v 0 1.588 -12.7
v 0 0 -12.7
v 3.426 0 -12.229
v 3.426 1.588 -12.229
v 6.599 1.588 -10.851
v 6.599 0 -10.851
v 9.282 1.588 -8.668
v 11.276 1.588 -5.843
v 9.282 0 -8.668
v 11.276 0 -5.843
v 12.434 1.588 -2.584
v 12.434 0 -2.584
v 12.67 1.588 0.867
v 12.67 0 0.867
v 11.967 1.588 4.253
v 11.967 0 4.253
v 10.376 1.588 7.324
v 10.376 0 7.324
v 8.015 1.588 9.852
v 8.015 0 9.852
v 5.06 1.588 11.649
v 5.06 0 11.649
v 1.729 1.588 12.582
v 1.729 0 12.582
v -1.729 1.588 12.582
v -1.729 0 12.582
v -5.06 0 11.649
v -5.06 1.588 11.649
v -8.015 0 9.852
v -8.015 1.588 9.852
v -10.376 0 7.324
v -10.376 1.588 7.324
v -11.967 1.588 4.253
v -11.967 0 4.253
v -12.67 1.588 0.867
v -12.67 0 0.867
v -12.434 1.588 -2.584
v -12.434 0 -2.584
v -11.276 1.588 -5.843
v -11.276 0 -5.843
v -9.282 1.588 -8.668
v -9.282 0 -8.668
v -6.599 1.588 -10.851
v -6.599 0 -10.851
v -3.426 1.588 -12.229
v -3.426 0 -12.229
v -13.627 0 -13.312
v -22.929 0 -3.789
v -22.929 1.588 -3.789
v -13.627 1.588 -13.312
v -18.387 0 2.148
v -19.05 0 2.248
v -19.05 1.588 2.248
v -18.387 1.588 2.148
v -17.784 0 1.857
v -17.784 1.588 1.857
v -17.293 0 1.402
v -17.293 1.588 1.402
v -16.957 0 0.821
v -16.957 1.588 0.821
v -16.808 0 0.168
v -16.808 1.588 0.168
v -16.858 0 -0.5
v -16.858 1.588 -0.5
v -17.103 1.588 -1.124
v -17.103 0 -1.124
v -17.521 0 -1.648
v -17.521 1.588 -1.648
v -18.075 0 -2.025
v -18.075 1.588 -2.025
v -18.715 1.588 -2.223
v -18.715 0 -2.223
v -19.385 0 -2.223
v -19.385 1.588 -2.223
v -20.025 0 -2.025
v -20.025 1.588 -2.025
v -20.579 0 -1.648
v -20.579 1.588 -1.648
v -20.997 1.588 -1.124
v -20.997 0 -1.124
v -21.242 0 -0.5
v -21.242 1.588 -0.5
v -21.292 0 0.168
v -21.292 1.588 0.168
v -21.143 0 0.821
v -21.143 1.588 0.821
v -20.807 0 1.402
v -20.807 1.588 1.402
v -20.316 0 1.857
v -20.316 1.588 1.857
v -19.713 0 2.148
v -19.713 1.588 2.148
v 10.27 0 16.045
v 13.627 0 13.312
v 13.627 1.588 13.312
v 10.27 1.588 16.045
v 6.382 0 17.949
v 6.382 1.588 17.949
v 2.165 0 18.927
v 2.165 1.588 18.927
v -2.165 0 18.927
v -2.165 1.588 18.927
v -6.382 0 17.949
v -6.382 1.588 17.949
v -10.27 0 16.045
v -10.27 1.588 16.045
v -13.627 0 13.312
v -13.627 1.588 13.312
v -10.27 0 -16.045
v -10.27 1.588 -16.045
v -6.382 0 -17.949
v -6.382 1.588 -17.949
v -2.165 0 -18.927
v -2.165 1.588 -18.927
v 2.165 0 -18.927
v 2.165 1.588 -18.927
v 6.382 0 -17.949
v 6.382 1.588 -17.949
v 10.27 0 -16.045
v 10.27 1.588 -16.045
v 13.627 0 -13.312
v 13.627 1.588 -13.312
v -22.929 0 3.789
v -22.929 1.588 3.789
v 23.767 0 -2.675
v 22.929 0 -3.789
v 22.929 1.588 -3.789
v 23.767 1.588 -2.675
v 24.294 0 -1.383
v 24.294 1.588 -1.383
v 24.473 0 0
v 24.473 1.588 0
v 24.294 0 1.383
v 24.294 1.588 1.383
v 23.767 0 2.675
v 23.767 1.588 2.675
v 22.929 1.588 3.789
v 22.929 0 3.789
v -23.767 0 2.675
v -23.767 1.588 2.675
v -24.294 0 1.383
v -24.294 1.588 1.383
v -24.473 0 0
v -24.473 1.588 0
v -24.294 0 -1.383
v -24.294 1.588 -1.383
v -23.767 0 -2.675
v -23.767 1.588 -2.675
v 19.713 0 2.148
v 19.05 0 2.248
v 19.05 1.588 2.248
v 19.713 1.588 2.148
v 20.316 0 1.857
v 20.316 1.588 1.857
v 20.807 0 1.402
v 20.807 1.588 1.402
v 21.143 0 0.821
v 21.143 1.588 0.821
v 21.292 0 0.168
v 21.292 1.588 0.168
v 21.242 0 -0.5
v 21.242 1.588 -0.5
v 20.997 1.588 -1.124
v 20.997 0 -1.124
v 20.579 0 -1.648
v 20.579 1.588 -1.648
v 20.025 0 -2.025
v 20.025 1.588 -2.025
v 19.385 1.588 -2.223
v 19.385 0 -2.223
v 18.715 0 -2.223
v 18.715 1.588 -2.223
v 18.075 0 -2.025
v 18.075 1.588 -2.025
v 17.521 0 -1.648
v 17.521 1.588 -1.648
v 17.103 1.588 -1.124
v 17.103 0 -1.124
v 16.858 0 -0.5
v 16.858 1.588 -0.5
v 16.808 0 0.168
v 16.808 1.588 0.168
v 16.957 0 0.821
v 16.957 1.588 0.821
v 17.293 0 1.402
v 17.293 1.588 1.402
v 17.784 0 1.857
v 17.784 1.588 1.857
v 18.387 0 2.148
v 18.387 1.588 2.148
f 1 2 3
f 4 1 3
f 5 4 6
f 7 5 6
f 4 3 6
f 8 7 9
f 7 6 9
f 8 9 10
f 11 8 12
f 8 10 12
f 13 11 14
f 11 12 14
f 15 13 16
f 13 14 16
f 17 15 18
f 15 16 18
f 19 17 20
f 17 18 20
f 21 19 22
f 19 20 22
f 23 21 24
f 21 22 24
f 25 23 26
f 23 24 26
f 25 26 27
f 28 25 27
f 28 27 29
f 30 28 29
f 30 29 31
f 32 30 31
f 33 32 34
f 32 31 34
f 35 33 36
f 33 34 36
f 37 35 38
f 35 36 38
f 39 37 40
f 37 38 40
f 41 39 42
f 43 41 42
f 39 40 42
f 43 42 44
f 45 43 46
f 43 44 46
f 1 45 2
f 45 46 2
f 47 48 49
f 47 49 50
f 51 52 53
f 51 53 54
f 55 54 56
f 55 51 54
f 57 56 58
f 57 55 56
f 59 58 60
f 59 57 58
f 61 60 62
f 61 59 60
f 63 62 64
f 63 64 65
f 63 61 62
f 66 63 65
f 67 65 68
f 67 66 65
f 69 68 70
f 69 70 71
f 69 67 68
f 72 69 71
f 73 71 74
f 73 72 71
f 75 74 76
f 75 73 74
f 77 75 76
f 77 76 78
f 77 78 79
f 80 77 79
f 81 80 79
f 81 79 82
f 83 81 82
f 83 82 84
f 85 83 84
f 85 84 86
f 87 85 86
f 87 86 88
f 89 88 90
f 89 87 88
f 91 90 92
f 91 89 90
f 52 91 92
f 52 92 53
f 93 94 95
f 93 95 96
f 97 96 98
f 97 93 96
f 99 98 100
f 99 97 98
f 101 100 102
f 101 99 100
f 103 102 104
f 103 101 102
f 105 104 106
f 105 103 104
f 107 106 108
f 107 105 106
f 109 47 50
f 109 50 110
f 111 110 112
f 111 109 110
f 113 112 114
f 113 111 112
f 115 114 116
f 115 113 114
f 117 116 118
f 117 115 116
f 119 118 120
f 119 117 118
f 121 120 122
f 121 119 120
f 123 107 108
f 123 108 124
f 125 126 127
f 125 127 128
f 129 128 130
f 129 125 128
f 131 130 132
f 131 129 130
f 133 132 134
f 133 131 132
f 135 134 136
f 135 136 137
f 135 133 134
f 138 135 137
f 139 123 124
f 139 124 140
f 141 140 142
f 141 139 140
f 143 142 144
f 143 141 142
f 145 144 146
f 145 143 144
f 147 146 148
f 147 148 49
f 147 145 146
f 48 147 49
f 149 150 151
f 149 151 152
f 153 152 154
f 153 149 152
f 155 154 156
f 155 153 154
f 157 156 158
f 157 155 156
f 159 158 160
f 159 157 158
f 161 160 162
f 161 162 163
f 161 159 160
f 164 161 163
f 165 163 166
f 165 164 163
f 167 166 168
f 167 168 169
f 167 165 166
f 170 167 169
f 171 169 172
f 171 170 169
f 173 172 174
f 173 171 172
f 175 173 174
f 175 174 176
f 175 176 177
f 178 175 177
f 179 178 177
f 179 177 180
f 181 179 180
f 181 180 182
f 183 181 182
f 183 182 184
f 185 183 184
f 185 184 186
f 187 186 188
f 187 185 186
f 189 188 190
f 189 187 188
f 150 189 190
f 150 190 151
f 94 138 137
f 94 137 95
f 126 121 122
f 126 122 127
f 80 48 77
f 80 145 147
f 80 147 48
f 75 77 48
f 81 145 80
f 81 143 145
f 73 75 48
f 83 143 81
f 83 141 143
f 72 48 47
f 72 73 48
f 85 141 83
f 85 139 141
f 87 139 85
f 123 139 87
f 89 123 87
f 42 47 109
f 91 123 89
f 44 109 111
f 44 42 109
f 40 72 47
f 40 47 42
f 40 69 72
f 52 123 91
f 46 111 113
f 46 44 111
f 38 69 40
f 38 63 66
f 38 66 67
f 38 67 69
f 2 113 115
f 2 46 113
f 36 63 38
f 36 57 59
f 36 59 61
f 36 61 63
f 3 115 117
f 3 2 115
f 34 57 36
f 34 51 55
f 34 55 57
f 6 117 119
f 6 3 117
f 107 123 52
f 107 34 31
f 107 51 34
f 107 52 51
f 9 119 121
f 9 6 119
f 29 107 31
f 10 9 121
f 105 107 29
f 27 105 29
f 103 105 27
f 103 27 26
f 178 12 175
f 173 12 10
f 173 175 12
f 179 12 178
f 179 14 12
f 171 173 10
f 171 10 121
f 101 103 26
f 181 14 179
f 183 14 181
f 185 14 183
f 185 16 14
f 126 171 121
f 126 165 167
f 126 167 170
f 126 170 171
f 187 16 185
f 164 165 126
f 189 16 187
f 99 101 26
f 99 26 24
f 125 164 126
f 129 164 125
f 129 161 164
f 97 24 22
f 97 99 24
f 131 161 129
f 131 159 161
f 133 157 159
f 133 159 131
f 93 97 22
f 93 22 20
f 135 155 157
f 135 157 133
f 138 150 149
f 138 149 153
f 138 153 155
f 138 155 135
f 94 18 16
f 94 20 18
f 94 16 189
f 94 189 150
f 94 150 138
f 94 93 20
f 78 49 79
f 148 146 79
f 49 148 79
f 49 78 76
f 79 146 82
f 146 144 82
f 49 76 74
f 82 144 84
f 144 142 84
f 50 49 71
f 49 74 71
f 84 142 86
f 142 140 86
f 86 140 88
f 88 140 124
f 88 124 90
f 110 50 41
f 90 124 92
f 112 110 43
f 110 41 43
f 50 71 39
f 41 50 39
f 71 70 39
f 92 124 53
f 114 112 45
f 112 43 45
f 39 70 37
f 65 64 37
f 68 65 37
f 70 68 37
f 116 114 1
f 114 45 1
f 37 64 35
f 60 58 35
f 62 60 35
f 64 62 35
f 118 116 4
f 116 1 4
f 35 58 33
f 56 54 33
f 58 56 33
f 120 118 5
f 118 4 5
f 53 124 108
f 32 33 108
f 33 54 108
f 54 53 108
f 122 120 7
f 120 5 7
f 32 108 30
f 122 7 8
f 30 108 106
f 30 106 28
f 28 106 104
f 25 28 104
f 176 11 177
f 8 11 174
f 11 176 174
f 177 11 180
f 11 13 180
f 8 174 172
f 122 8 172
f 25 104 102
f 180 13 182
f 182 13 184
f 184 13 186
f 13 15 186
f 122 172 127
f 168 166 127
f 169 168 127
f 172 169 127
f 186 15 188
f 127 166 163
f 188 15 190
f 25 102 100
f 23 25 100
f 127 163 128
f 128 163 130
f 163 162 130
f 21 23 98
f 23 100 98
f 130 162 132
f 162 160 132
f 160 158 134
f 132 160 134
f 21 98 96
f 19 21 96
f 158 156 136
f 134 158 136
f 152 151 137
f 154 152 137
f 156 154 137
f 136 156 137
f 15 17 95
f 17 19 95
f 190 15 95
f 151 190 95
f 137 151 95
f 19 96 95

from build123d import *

# Parameters (mm, degrees)
SKETCH1_R           = 15.6845
SKETCH1_R_2         = 2.2479
BOSS_EXTRUDE1_DEPTH = 1.5875
SKETCH2_R           = 15.6845
SKETCH2_R_2         = 12.7
BOSS_EXTRUDE2_DEPTH = 1.5875


with BuildPart() as part:
    # Sketch1 → Boss-Extrude1 (new body)
    with BuildSketch(Plane(origin=(0, 0, 0), x_dir=(1, 0, 0), z_dir=(0, 1, 0))):
        with BuildLine():
            Line((-22.929181133, 3.78943243), (-13.6271, 13.311823526))
            ThreePointArc((-13.6271, 13.311823526), (0, 19.05), (13.6271, 13.311823526))
            Line((13.6271, 13.311823526), (22.929181133, 3.78943243))
            ThreePointArc((22.929181133, 3.78943243), (24.4729, 0), (22.929181133, -3.78943243))
            Line((22.929181133, -3.78943243), (13.6271, -13.311823526))
            ThreePointArc((13.6271, -13.311823526), (0, -19.05), (-13.6271, -13.311823526))
            Line((-13.6271, -13.311823526), (-22.929181133, -3.78943243))
            ThreePointArc((-22.929181133, -3.78943243), (-24.4729, 0), (-22.929181133, 3.78943243))
        make_face()
        with Locations(Location((0, 0, 0), (0, 0, 270))):
            Circle(SKETCH1_R, mode=Mode.SUBTRACT)
        with Locations(Location((-19.05, 0, 0), (0, 0, 270))):
            Circle(SKETCH1_R_2, mode=Mode.SUBTRACT)
        with Locations(Location((19.05, 0, 0), (0, 0, 270))):
            Circle(SKETCH1_R_2, mode=Mode.SUBTRACT)
    extrude(amount=BOSS_EXTRUDE1_DEPTH)

    # Sketch2 → Boss-Extrude2 (add)
    with BuildSketch(Plane.XZ):
        Circle(SKETCH2_R)
        with Locations(Location((0, 0, 0), (0, 0, 270))):
            Circle(SKETCH2_R_2, mode=Mode.SUBTRACT)
    extrude(amount=-BOSS_EXTRUDE2_DEPTH)


solid = part.part
